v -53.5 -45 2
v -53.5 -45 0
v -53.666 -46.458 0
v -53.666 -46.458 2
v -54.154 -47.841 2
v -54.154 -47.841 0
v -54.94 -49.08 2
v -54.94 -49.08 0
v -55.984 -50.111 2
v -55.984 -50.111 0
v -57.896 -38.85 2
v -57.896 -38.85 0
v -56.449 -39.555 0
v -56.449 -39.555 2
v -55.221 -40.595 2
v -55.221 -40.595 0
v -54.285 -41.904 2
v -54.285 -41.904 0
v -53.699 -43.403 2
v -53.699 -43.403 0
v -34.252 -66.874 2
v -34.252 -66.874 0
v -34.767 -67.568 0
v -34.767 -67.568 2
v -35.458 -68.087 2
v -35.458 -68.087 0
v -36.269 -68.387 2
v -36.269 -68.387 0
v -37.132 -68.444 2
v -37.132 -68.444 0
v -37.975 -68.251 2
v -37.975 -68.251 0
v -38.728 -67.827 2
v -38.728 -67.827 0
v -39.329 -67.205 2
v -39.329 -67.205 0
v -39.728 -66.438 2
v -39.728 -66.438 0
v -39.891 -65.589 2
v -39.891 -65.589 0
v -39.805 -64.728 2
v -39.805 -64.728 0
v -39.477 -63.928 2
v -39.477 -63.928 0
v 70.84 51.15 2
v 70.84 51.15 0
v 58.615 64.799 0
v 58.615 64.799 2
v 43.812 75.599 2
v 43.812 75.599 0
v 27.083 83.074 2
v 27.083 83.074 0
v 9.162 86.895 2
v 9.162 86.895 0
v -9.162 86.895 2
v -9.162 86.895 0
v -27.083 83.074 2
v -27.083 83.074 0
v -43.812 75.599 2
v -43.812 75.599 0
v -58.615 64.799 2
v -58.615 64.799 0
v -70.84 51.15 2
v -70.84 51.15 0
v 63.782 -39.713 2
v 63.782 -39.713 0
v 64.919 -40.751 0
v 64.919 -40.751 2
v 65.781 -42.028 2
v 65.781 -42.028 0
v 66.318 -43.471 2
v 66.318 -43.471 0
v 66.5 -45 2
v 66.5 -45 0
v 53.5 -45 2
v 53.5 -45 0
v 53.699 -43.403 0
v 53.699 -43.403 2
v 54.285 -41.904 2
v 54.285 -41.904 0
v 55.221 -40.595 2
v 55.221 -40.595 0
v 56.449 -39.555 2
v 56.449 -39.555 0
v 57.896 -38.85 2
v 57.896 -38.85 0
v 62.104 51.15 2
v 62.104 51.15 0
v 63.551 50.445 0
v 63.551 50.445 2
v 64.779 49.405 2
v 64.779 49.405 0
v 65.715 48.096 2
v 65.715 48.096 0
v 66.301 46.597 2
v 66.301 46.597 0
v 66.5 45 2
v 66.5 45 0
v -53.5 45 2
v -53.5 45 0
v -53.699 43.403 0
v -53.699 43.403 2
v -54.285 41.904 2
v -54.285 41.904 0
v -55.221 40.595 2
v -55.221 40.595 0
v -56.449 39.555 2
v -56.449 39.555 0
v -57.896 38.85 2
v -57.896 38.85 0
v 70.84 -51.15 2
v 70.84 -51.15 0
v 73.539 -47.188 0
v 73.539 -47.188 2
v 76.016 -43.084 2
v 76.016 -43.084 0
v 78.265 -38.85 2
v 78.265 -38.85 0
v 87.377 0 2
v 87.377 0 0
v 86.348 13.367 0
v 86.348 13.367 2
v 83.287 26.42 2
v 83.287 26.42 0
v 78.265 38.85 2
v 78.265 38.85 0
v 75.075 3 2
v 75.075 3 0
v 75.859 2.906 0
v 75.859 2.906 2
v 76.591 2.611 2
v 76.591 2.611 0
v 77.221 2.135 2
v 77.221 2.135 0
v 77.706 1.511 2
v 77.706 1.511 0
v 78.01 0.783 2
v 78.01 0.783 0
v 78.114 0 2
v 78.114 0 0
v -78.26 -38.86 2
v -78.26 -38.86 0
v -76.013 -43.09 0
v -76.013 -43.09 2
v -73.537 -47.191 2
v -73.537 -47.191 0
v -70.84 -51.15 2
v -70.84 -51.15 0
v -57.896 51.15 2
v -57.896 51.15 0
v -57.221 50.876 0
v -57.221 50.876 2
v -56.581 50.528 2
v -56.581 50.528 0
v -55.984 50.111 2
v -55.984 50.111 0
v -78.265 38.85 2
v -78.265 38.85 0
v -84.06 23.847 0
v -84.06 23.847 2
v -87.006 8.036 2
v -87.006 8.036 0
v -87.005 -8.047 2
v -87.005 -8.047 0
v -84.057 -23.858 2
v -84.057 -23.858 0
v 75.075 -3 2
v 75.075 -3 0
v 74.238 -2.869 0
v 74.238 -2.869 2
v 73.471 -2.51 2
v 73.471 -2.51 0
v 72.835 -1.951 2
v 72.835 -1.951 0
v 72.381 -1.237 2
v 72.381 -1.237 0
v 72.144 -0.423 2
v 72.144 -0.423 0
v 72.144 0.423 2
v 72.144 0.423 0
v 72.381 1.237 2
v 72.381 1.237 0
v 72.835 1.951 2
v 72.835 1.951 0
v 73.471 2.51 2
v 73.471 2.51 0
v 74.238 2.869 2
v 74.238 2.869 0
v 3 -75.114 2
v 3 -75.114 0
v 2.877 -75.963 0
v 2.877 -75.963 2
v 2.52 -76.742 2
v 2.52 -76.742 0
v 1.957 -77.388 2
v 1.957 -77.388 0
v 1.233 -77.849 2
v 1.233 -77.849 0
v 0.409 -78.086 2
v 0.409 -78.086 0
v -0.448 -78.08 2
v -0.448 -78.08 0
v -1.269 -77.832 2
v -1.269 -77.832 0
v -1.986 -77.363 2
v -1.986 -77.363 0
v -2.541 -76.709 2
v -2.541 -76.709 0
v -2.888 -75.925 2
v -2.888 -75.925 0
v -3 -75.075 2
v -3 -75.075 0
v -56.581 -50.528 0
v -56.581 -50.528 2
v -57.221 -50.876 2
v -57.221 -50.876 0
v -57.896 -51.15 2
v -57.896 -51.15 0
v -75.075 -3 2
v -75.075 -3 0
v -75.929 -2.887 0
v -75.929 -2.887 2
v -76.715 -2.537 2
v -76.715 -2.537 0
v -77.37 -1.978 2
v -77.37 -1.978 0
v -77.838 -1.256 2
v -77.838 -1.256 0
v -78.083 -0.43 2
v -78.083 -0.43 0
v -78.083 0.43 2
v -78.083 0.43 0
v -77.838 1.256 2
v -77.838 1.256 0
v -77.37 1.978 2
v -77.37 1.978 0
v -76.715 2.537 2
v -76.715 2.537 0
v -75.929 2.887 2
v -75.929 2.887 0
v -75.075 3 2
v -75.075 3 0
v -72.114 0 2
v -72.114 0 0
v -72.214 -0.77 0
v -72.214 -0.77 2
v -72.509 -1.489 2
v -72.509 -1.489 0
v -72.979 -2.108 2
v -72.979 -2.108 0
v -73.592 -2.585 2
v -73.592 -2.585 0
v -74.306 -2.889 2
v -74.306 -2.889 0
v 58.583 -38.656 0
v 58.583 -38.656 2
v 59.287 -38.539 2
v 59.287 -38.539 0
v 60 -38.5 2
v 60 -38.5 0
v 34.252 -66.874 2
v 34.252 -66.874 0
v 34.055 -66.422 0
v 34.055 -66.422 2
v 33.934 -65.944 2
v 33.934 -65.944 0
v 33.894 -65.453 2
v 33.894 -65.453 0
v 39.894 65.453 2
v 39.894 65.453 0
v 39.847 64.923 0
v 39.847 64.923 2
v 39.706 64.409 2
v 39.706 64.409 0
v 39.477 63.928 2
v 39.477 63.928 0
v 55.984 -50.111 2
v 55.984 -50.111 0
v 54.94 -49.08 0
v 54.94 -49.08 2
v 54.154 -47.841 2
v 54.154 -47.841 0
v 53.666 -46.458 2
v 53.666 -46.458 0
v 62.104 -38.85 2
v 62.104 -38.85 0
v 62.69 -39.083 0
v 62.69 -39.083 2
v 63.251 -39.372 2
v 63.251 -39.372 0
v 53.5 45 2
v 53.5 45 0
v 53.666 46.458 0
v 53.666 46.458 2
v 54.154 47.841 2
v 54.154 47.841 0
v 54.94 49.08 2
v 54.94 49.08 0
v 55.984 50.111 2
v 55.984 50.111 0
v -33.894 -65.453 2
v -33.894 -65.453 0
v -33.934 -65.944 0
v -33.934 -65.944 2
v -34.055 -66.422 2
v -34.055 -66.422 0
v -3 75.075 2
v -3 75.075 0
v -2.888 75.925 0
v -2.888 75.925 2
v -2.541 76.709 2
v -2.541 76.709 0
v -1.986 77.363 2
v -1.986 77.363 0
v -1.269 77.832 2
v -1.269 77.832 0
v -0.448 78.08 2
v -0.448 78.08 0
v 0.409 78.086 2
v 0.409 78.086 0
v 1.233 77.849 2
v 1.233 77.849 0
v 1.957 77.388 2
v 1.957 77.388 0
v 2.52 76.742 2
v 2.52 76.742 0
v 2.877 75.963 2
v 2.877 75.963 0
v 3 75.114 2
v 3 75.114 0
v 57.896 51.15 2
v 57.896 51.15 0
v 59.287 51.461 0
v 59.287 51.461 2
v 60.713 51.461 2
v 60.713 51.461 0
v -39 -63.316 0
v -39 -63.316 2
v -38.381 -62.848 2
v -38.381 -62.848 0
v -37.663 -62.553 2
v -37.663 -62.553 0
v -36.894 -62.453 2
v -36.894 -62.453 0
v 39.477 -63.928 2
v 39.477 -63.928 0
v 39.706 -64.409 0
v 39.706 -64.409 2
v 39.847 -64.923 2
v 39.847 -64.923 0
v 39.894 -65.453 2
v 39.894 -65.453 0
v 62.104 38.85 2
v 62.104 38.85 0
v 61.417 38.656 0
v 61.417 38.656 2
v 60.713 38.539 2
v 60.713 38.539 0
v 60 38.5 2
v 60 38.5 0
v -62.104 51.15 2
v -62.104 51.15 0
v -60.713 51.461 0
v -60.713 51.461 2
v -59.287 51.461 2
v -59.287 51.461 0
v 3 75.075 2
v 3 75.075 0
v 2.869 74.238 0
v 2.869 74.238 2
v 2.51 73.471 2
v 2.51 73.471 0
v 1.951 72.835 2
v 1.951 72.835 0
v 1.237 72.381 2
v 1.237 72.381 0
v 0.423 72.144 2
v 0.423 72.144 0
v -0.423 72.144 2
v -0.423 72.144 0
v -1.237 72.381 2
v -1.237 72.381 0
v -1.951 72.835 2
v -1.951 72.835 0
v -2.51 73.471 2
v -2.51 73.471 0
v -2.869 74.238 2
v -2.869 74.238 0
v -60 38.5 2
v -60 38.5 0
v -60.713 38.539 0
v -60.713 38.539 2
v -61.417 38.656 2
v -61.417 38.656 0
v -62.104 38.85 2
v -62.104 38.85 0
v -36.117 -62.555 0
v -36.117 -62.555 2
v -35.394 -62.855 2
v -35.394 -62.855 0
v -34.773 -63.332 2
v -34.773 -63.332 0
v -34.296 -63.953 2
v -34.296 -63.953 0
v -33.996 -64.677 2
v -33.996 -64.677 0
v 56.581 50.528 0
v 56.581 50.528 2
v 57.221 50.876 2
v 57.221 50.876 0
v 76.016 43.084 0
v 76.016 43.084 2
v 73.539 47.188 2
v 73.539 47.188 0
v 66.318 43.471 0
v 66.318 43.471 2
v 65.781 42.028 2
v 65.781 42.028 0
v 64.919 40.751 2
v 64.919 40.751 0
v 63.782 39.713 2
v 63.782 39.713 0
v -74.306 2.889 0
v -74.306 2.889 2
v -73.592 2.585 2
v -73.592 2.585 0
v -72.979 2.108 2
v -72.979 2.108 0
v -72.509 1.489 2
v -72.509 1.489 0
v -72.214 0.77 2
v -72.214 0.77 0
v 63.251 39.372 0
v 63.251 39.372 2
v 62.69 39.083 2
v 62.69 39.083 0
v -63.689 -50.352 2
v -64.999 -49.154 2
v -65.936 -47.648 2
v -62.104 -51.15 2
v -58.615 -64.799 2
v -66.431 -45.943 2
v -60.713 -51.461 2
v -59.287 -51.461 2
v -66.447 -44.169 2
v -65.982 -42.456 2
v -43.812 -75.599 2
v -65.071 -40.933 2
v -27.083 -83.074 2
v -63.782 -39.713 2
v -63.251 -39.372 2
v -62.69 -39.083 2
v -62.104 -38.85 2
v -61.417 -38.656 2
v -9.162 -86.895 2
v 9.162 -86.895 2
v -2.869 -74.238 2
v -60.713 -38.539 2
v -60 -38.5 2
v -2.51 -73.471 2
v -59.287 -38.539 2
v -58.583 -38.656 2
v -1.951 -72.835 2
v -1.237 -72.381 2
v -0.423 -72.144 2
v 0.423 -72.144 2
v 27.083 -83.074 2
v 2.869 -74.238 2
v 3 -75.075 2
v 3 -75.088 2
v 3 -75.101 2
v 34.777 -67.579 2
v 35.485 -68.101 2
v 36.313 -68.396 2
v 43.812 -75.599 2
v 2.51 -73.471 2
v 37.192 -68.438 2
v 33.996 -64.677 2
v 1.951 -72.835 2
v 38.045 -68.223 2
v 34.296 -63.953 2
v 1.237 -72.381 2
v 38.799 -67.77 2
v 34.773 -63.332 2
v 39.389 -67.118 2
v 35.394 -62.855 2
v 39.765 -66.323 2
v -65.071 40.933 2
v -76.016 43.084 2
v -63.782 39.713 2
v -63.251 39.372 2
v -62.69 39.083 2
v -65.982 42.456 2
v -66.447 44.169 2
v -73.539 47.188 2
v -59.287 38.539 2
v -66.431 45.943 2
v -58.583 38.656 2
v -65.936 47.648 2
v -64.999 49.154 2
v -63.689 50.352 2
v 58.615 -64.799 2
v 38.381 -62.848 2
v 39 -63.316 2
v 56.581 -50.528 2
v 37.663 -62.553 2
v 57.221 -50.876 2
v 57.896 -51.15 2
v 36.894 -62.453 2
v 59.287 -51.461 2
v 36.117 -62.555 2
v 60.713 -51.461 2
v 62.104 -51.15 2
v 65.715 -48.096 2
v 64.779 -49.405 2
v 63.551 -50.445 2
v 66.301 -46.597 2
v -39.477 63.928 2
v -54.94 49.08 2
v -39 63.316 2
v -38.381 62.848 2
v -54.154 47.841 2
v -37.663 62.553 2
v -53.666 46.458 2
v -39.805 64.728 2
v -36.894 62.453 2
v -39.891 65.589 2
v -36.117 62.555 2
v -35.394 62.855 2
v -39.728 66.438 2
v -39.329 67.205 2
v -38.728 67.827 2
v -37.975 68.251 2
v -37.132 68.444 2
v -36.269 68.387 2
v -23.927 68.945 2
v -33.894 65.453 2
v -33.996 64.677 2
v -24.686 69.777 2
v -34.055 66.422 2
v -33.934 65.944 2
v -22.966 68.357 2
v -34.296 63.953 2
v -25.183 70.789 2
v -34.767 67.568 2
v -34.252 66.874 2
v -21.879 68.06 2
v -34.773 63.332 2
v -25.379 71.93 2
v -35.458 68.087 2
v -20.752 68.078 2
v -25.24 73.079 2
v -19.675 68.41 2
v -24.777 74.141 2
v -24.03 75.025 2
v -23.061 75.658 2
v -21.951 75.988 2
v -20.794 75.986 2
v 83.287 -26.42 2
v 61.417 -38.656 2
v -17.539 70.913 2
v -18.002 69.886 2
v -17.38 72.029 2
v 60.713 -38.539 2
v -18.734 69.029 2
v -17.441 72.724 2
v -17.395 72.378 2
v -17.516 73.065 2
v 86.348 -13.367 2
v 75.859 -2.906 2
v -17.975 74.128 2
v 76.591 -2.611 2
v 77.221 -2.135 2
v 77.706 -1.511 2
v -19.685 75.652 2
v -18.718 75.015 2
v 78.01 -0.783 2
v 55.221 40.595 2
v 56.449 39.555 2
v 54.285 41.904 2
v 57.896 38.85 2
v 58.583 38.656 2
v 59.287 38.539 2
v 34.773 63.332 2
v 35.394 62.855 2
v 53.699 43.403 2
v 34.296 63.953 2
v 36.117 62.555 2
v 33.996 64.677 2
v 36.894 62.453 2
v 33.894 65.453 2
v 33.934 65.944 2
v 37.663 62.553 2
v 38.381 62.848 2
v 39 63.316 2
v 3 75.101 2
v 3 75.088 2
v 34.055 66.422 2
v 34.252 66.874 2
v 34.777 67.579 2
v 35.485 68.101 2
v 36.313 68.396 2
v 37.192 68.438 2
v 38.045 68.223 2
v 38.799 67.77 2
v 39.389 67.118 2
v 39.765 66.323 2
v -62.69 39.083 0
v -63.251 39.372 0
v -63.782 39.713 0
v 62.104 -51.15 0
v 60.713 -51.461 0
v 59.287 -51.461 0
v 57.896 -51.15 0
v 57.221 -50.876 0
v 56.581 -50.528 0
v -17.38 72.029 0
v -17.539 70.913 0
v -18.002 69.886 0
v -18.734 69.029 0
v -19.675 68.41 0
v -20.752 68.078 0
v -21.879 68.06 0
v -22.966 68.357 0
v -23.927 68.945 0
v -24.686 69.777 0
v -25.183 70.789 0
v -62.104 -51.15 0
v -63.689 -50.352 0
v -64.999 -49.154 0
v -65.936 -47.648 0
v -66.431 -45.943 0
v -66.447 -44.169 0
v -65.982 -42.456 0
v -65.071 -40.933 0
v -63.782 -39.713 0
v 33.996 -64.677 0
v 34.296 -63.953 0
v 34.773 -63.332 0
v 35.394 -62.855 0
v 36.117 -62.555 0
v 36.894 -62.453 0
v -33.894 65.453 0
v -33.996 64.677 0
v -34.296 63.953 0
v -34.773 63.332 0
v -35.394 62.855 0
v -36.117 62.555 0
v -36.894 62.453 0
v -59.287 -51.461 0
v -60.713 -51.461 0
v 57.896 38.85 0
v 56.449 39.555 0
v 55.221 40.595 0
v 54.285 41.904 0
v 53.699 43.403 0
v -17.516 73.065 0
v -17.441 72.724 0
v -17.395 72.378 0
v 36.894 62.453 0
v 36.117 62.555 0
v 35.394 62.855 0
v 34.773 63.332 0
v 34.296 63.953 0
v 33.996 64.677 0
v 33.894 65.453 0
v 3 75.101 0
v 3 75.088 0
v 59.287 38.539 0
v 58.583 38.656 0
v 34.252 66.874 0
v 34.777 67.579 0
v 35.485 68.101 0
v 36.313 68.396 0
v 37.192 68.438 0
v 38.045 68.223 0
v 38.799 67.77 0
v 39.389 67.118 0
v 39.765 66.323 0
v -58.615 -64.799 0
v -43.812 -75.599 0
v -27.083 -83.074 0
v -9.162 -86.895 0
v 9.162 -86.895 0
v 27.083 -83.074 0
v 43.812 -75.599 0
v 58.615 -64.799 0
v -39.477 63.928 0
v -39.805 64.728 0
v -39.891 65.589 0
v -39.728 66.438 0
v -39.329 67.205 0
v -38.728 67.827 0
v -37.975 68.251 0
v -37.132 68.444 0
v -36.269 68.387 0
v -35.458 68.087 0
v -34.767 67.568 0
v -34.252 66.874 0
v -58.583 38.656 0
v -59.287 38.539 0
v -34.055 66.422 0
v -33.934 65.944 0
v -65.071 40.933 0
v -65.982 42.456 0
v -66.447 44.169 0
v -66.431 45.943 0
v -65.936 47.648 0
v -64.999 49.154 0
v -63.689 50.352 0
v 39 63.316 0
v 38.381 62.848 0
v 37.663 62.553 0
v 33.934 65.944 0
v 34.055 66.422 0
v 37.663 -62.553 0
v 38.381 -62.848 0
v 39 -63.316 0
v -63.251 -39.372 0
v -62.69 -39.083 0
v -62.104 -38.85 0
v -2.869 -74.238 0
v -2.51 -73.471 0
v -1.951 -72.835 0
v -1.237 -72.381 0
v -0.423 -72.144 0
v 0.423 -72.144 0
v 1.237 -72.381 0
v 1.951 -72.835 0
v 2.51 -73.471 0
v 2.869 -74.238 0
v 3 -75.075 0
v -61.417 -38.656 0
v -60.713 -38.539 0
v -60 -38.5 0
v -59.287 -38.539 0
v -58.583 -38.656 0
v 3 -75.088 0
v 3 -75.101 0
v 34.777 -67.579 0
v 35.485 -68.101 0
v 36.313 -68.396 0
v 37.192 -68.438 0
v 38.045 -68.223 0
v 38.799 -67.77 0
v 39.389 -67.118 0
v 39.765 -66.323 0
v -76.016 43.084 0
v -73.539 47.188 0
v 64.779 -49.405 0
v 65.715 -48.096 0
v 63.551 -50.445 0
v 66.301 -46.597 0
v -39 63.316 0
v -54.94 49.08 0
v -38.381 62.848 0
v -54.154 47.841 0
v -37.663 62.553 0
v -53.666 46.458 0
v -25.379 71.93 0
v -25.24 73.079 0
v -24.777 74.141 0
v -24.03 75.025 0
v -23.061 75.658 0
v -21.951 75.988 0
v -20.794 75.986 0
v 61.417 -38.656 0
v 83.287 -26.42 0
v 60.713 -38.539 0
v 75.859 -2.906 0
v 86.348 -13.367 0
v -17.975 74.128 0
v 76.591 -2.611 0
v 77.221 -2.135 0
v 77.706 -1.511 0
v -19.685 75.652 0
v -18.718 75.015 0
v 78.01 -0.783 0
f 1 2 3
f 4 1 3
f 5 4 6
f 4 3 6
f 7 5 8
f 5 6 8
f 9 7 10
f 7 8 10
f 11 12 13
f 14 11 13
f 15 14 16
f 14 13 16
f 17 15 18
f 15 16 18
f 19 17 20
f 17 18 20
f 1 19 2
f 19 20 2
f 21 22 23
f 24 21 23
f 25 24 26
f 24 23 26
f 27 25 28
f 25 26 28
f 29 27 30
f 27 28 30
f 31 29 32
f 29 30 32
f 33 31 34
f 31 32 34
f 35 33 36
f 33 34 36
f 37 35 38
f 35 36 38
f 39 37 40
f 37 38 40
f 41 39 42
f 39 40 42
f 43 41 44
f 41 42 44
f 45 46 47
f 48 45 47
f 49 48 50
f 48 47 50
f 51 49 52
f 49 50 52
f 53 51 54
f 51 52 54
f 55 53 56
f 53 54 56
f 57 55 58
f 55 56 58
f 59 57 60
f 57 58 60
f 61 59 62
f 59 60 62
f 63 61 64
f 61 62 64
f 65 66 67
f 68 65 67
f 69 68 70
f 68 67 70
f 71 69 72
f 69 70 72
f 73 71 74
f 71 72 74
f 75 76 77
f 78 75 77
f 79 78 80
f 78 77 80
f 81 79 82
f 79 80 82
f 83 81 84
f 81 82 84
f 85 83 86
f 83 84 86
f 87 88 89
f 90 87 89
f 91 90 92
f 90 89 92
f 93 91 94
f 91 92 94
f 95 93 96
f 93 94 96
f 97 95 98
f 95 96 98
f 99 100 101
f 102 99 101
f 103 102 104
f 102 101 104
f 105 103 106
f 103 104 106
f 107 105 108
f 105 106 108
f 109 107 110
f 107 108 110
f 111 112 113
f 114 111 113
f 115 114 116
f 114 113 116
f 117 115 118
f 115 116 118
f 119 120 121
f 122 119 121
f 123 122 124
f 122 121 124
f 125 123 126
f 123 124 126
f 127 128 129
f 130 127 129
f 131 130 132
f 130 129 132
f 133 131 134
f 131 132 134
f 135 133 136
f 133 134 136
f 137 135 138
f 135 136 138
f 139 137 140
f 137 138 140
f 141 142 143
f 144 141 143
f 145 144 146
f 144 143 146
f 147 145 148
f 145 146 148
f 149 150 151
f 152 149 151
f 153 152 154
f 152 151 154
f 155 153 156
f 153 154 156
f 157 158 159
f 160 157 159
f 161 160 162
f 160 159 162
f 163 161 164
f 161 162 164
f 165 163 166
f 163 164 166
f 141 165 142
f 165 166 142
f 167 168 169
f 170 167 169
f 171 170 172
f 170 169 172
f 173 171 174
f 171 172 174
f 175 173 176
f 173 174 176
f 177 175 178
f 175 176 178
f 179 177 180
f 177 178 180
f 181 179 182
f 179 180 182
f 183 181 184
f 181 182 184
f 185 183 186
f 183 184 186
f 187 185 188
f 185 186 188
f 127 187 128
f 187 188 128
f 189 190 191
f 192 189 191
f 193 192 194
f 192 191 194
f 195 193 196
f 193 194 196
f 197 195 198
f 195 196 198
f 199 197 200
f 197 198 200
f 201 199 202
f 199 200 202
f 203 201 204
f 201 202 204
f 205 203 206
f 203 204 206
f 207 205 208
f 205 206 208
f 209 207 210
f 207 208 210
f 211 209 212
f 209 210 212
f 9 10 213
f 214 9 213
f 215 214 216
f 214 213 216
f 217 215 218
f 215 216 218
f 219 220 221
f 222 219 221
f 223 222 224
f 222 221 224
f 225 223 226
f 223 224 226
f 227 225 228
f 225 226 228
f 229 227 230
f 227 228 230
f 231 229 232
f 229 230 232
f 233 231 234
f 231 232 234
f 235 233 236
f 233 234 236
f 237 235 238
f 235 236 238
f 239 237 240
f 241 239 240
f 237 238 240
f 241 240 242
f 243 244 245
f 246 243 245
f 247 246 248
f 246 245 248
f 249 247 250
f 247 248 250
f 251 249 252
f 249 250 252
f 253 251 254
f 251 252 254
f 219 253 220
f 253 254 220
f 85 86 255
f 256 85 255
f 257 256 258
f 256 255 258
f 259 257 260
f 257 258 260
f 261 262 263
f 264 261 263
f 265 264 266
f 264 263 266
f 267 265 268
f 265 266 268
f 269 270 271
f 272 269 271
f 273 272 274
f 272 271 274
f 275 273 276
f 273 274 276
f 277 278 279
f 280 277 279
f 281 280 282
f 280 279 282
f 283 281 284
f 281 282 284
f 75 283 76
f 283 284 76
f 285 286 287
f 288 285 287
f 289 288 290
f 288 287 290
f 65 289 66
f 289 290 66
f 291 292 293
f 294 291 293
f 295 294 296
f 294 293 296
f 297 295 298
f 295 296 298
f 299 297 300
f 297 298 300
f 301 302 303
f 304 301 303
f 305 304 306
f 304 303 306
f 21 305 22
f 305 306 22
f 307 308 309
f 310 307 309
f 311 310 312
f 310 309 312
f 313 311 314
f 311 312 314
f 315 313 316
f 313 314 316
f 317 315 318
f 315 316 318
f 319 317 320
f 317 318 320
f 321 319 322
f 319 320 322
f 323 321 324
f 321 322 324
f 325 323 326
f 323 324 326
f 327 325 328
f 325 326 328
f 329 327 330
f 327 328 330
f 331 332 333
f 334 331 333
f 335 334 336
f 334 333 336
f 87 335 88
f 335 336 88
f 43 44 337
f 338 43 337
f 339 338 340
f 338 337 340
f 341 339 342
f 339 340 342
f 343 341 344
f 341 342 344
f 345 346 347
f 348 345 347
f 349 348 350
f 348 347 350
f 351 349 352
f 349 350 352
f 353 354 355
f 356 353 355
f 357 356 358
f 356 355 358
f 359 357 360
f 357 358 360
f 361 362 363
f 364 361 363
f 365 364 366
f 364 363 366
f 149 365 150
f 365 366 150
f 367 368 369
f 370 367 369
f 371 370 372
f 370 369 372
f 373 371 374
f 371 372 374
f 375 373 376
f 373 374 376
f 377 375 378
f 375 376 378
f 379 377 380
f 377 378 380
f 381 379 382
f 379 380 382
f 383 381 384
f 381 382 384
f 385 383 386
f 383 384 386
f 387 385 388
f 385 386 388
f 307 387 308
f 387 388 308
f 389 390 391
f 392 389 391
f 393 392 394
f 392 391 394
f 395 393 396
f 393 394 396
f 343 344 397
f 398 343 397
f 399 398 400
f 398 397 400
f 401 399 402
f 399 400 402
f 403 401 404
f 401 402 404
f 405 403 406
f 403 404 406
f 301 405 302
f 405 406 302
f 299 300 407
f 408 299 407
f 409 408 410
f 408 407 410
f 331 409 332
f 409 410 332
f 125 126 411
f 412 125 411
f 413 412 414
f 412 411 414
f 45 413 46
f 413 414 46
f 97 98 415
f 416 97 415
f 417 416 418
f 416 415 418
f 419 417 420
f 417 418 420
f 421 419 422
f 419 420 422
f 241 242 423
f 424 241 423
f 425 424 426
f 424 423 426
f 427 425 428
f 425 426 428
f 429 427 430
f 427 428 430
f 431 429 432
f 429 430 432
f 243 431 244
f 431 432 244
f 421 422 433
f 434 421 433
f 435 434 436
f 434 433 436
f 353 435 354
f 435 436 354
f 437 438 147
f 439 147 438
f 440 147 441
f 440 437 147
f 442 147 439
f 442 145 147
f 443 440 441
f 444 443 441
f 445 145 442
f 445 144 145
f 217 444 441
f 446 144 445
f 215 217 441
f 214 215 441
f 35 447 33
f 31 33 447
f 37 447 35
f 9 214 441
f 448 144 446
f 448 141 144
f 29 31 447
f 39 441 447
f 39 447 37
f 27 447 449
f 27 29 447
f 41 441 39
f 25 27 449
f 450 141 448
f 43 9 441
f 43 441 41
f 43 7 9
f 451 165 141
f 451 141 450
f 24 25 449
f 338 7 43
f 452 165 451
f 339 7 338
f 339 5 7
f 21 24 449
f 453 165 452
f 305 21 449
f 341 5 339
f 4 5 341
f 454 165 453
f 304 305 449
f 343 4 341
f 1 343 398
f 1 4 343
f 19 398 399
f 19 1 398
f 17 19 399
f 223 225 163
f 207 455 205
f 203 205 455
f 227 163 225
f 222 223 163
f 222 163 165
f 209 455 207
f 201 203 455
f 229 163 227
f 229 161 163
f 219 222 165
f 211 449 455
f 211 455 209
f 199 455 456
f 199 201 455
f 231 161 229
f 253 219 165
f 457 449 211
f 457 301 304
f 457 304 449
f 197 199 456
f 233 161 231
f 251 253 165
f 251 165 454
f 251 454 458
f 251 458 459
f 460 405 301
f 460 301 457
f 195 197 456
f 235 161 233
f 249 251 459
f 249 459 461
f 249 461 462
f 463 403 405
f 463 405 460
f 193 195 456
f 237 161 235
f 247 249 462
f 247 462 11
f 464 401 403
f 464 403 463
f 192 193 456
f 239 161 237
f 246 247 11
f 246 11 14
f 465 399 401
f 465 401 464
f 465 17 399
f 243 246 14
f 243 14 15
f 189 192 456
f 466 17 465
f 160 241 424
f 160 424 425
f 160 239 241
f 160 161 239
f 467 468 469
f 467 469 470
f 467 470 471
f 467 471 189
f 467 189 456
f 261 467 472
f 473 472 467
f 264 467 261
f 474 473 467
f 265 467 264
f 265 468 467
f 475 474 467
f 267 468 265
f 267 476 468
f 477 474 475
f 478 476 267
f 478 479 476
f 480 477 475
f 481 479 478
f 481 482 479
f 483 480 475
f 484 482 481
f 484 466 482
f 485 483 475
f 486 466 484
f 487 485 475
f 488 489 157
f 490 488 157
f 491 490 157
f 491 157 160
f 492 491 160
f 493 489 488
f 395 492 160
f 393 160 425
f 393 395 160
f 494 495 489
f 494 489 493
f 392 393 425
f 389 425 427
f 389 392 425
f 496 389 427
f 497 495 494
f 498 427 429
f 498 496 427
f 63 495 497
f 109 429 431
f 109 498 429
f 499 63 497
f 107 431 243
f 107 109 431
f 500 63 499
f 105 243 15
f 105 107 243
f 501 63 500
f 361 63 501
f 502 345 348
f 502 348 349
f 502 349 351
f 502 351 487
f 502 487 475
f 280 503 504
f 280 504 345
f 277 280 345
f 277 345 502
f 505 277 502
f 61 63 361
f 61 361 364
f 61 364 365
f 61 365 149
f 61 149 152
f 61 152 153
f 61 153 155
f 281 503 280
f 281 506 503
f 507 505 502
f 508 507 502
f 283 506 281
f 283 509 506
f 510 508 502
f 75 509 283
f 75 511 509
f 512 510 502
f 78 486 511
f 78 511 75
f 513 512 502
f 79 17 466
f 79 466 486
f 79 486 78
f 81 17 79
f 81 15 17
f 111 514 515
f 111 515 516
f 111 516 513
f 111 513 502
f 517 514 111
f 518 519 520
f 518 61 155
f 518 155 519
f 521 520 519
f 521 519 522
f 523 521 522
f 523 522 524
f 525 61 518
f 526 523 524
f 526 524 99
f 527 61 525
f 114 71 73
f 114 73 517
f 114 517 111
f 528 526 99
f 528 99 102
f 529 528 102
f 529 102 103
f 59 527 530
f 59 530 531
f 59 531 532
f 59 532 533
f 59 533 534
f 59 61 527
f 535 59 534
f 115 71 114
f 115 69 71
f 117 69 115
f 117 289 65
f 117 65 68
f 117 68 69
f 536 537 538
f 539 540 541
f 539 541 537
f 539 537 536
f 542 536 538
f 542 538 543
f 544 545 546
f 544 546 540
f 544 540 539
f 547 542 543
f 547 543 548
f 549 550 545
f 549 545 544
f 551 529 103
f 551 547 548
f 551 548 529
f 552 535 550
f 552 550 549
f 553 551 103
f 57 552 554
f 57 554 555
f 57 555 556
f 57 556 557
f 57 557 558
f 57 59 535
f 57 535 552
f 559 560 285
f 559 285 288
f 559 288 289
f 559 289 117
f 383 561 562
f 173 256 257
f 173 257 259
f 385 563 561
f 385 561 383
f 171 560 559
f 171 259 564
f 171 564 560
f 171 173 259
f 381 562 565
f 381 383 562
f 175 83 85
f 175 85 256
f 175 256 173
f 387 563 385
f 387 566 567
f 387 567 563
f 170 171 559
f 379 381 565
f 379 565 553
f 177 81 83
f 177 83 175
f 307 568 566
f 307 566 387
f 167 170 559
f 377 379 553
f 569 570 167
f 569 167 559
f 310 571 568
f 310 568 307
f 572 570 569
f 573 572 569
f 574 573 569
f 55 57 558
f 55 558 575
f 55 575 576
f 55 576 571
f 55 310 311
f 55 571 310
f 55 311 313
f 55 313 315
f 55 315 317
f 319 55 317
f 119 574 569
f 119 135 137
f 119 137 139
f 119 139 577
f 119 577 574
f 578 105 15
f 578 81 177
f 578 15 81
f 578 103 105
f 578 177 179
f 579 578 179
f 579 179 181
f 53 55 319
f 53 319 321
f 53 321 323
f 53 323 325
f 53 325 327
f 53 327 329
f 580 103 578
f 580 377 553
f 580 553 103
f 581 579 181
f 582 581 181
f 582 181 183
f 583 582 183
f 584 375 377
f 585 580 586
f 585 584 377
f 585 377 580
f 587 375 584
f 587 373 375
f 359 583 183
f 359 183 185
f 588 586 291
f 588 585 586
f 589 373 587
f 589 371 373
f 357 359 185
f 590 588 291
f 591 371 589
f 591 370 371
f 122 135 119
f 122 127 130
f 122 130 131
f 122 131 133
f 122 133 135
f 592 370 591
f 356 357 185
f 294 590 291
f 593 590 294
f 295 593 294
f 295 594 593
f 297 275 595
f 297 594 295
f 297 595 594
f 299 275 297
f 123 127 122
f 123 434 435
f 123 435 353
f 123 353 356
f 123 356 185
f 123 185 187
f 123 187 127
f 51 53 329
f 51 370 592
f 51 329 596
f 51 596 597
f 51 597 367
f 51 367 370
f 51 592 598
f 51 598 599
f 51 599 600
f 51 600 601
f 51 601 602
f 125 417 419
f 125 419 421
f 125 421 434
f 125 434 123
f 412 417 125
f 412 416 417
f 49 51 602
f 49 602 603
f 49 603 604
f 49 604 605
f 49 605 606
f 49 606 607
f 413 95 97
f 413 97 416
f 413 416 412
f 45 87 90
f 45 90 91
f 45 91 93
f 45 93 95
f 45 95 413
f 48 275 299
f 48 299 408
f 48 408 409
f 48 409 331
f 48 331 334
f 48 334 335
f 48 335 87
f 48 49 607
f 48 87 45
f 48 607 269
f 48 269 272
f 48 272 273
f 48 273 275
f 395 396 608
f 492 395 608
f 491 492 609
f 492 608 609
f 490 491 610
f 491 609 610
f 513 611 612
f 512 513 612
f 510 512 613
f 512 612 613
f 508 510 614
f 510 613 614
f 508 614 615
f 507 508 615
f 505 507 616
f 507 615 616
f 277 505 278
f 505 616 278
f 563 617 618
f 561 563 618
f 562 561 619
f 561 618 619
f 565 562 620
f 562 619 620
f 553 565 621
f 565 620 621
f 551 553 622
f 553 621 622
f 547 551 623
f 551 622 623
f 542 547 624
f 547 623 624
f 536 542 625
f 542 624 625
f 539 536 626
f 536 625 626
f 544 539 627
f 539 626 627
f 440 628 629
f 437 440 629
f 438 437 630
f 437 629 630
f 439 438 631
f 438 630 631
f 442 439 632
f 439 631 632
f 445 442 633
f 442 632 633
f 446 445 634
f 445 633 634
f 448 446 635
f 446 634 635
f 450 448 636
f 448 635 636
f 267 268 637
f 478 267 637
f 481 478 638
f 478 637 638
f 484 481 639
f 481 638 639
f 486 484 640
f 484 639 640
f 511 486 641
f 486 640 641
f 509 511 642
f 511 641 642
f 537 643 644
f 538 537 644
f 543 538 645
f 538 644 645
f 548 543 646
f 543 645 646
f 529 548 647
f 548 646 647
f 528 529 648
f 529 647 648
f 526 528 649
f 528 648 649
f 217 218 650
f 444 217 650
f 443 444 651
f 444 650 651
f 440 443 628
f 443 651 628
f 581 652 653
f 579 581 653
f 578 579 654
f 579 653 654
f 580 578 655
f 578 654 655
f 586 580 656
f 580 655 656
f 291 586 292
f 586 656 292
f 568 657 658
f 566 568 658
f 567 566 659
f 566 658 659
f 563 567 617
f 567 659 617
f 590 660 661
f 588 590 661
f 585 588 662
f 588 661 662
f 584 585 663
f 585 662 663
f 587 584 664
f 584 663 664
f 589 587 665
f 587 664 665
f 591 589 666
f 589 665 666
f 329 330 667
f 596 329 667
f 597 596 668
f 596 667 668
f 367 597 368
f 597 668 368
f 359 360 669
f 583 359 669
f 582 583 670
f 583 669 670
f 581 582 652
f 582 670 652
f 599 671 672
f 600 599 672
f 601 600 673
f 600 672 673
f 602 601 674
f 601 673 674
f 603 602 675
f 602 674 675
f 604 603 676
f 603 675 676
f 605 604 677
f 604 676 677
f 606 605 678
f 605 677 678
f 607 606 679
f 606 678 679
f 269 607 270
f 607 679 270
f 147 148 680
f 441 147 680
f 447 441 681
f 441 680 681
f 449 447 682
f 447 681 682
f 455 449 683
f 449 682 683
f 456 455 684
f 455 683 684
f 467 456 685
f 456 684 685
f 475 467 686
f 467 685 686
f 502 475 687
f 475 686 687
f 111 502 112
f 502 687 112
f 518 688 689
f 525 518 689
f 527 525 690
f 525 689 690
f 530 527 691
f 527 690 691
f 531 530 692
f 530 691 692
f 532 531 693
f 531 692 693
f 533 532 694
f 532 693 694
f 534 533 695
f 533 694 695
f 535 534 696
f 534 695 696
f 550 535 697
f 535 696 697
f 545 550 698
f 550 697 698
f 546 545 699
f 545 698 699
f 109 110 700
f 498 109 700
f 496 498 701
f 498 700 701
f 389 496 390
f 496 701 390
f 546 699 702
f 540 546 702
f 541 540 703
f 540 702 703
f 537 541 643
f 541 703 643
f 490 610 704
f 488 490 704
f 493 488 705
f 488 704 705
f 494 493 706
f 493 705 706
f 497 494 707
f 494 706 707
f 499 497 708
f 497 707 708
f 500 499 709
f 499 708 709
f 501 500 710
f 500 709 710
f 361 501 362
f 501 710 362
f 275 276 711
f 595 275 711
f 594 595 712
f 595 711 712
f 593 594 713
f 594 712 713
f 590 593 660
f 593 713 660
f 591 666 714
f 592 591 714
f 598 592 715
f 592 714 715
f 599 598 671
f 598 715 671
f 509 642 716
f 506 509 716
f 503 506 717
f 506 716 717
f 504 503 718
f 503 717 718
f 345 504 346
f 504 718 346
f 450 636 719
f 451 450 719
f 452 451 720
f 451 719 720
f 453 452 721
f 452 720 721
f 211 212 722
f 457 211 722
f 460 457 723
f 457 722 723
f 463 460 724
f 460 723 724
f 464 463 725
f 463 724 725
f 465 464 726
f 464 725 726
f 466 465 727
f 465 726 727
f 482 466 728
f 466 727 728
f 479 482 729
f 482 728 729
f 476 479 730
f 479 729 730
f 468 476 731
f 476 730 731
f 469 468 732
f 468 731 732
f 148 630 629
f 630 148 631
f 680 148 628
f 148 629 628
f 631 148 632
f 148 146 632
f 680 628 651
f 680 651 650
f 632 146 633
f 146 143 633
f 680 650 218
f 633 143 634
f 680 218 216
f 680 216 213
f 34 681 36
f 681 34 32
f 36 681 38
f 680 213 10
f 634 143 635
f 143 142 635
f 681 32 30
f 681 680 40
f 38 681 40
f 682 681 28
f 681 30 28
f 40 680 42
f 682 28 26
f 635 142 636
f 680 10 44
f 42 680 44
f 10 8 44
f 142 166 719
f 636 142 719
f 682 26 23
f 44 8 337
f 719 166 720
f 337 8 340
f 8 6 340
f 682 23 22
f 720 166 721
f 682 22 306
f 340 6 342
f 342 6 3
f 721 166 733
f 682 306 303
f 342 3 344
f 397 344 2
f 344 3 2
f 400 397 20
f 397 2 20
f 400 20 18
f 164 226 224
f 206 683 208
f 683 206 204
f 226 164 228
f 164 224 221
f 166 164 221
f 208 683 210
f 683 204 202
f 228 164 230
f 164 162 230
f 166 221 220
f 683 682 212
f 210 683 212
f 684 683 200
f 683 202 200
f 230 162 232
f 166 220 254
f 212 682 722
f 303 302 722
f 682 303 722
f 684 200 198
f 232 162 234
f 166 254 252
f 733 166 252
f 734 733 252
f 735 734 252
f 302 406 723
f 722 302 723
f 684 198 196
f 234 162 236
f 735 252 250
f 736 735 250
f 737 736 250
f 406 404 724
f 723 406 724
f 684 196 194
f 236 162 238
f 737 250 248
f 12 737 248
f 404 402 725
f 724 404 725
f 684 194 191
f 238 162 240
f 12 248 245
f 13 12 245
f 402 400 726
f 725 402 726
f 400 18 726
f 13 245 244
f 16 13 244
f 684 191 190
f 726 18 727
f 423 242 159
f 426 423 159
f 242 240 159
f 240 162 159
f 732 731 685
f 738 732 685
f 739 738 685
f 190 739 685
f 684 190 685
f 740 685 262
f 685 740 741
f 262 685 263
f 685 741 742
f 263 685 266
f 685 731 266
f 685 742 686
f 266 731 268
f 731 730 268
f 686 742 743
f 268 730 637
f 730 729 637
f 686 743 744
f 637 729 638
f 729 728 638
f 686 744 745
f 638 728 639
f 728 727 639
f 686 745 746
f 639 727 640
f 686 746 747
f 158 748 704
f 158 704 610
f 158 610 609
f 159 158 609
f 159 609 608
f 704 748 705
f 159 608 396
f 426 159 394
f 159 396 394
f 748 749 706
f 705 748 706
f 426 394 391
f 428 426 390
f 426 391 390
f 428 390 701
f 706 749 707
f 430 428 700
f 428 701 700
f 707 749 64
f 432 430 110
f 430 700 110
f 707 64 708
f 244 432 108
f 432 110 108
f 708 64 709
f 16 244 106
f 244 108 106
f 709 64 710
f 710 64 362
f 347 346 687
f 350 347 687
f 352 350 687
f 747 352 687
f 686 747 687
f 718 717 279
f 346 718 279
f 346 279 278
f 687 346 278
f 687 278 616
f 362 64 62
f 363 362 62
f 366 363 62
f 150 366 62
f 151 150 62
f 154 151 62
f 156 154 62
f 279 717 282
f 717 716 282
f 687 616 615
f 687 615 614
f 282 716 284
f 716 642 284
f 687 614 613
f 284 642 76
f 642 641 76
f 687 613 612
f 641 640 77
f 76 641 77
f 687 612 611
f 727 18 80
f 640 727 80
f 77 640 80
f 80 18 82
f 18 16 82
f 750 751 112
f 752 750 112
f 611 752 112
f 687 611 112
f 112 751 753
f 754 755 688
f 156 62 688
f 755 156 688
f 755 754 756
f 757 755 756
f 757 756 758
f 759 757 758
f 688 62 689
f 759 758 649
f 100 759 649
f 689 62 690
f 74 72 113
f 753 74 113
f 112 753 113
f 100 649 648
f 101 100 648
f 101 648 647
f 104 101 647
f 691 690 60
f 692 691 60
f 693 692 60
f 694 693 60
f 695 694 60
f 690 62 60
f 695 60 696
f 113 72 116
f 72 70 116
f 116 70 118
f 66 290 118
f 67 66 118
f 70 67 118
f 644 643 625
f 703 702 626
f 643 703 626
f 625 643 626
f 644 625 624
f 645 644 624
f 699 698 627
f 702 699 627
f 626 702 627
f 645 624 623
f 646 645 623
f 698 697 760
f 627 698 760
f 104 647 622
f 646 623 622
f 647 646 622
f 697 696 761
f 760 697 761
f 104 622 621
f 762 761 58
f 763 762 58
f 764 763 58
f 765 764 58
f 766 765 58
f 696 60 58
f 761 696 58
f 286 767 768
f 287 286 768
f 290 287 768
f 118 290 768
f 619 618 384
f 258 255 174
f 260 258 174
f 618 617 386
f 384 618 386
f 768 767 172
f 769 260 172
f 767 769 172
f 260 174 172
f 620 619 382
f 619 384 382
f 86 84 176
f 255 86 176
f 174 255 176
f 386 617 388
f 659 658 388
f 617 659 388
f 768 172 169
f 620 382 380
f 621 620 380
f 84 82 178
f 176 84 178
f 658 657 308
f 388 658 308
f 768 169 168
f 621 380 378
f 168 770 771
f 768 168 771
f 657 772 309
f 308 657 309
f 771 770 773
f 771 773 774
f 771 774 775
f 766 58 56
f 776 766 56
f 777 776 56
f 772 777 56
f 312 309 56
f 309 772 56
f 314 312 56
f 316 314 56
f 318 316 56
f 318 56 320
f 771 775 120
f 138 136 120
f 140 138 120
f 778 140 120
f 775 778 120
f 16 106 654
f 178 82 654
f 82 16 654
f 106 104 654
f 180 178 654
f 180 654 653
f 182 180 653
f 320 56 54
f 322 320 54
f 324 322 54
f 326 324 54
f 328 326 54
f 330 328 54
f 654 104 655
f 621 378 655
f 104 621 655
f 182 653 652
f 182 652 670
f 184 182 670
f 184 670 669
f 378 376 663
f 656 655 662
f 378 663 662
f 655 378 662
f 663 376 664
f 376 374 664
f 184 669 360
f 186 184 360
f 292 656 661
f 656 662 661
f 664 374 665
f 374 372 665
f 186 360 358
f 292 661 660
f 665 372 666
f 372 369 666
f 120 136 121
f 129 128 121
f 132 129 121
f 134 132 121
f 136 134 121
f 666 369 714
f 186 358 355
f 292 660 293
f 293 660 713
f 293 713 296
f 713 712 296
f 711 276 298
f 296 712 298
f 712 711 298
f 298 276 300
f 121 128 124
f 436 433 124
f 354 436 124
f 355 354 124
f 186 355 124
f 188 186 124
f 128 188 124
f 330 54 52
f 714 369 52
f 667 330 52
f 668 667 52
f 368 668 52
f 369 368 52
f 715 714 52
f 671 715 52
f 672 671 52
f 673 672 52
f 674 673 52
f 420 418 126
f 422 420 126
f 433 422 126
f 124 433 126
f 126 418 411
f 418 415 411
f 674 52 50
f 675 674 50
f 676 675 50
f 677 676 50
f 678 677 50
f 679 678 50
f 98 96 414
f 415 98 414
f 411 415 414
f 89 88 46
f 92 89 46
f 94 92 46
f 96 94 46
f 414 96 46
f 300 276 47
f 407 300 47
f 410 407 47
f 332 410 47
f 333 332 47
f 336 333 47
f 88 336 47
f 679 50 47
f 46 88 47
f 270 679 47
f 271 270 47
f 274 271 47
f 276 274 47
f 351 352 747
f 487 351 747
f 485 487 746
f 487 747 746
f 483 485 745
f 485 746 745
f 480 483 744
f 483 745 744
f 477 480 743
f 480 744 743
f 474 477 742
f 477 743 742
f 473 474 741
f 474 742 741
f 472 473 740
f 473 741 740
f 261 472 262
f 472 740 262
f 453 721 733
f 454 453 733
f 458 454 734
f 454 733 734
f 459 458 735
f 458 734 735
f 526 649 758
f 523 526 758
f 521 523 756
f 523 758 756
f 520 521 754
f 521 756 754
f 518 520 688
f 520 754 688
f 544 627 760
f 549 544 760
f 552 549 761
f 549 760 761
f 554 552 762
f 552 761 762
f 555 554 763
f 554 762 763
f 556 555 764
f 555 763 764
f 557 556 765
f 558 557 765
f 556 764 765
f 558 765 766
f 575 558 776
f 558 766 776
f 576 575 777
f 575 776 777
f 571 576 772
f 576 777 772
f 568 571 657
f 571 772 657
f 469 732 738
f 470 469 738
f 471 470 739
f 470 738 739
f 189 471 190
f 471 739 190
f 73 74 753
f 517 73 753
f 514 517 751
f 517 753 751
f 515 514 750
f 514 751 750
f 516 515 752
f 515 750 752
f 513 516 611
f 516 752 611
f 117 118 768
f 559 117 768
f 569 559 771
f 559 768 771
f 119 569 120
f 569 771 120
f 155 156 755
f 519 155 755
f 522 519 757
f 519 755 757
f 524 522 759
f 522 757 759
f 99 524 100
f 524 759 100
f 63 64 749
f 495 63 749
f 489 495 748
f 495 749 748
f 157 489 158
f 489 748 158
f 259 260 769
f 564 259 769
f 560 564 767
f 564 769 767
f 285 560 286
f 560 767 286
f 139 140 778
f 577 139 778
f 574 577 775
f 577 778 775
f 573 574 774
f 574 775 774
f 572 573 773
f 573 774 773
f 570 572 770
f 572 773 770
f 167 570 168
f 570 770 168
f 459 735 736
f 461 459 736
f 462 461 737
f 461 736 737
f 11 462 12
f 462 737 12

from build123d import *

# Parameters (mm, degrees)
F0_W     = 73.7878350085
F0_H     = 90
F1_DEPTH = 2


with BuildPart() as f1:
    # F0 (on Top) → F1 (new body)
    with BuildSketch(Plane.XY):
        with BuildLine():
            ThreePointArc((39.4774058129, 63.9279924987), (48.2279395476, 57.613536965), (55.983679509, 50.110691706))
            ThreePointArc((55.983679509, 50.110691706), (56.8959512618, 50.7109440052), (57.8958374587, 51.15))
            ThreePointArc((57.8958374587, 51.15), (60, 51.5), (62.1041625413, 51.15))
            Line((62.1041625413, 51.15), (70.8404665627, 51.15))
            ThreePointArc((70.8404665627, 51.15), (0, 87.3767371949), (-70.8404665627, 51.15))
            Line((-70.8404665627, 51.15), (-62.1041625413, 51.15))
            ThreePointArc((-62.1041625413, 51.15), (-60, 51.5), (-57.8958374587, 51.15))
            ThreePointArc((-57.8958374587, 51.15), (-56.8959512618, 50.7109440052), (-55.983679509, 50.110691706))
            ThreePointArc((-55.983679509, 50.110691706), (-48.2279395476, 57.613536965), (-39.4774058129, 63.9279924987))
            ThreePointArc((-39.4774058129, 63.9279924987), (-38.367024498, 68.0663988295), (-34.2516107138, 66.8736192989))
            ThreePointArc((-34.2516107138, 66.8736192989), (-29.7817001102, 68.980461967), (-25.1829669608, 70.7889254734))
            ThreePointArc((-25.1829669608, 70.7889254734), (-22.5182029217, 75.8634534118), (-17.5164058914, 73.0645558344))
            ThreePointArc((-17.5164058914, 73.0645558344), (-10.3072112299, 74.4245604037), (-2.9997471594, 75.0749979128))
            ThreePointArc((-2.9997471594, 75.0749979128), (-0.0194746205, 78.1138831224), (3, 75.1139463332))
            ThreePointArc((3, 75.1139463332), (2.9999367892, 75.0944717127), (2.9997471594, 75.0749979128))
            ThreePointArc((2.9997471594, 75.0749979128), (19.0717479179, 72.6740822163), (34.2516107138, 66.8736192989))
            ThreePointArc((34.2516107138, 66.8736192989), (37.6264062853, 68.3621830914), (39.8939175043, 65.4529804196))
            ThreePointArc((39.8939175043, 65.4529804196), (39.7879168932, 64.6625580408), (39.4774058129, 63.9279924987))
        make_face()
        with BuildLine():
            Line((-62.1041625413, 51.15), (-70.8404665627, 51.15))
            ThreePointArc((-70.8404665627, 51.15), (-74.8058433026, 45.1528516332), (-78.2647538987, 38.85))
            Line((-78.2647538987, 38.85), (-64.3112066022, 38.85))
            ThreePointArc((-64.3112066022, 38.85), (-64.0479051477, 39.2825615358), (-63.7816943003, 39.713338651))
            ThreePointArc((-63.7816943003, 39.713338651), (-66.4311844471, 45.9433274125), (-62.1041625413, 51.15))
        make_face()
        with BuildLine():
            ThreePointArc((-43.3733789322, 45), (-40.2260149068, 47.834273536), (-36.8939175043, 50.4488736365))
            Line((-36.8939175043, 50.4488736365), (-36.8939175043, 62.4529804196))
            ThreePointArc((-36.8939175043, 62.4529804196), (-38.3813710728, 62.8477008029), (-39.4774058129, 63.9279924987))
            ThreePointArc((-39.4774058129, 63.9279924987), (-48.2279395476, 57.613536965), (-55.983679509, 50.110691706))
            ThreePointArc((-55.983679509, 50.110691706), (-54.1538010985, 47.8411192169), (-53.5, 45))
            Line((-53.5, 45), (-43.3733789322, 45))
        make_face()
        with BuildLine():
            Line((-43.3733789322, 45), (-36.8939175043, 45))
            Line((-36.8939175043, 45), (-36.8939175043, 50.4488736365))
            ThreePointArc((-36.8939175043, 50.4488736365), (-40.2260149068, 47.834273536), (-43.3733789322, 45))
        make_face()
        with BuildLine():
            ThreePointArc((-63.7816943003, 39.713338651), (-64.0479051477, 39.2825615358), (-64.3112066022, 38.85))
            Line((-64.3112066022, 38.85), (-62.1041625413, 38.85))
            ThreePointArc((-62.1041625413, 38.85), (-62.9744186149, 39.2204815163), (-63.7816943003, 39.713338651))
        make_face()
        with BuildLine():
            ThreePointArc((-60, 17.5), (-53.484356292, 32.3368772771), (-43.3733789322, 45))
            Line((-43.3733789322, 45), (-53.5, 45))
            ThreePointArc((-53.5, 45), (-54.7119447564, 41.2202550693), (-57.8958374587, 38.85))
            ThreePointArc((-57.8958374587, 38.85), (-58.9334635496, 38.5880970063), (-60, 38.5))
            Line((-60, 38.5), (-60, 17.5))
        make_face()
        with BuildLine():
            ThreePointArc((-36.8939175043, 50.4488736365), (0, 62.5), (36.8939175043, 50.4488736365))
            Line((36.8939175043, 50.4488736365), (36.8939175043, 62.4529804196))
            ThreePointArc((36.8939175043, 62.4529804196), (34.7725971607, 63.3316600761), (33.8939175043, 65.4529804196))
            Line((33.8939175043, 65.4529804196), (-33.8939175043, 65.4529804196))
            ThreePointArc((-33.8939175043, 65.4529804196), (-34.7725971607, 63.3316600761), (-36.8939175043, 62.4529804196))
            Line((-36.8939175043, 62.4529804196), (-36.8939175043, 50.4488736365))
        make_face()
        with BuildLine():
            Line((-33.8939175043, 65.4529804196), (33.8939175043, 65.4529804196))
            ThreePointArc((33.8939175043, 65.4529804196), (33.9847148325, 66.1854692007), (34.2516107138, 66.8736192989))
            ThreePointArc((34.2516107138, 66.8736192989), (19.0717479179, 72.6740822163), (2.9997471594, 75.0749979128))
            ThreePointArc((2.9997471594, 75.0749979128), (0, 72.1139463332), (-2.9997471594, 75.0749979128))
            ThreePointArc((-2.9997471594, 75.0749979128), (-10.3072112299, 74.4245604037), (-17.5164058914, 73.0645558344))
            ThreePointArc((-17.5164058914, 73.0645558344), (-17.4142364393, 72.5511577989), (-17.3799844218, 72.0288141007))
            ThreePointArc((-17.3799844218, 72.0288141007), (-20.7522624117, 68.0783755075), (-25.1829669608, 70.7889254734))
            ThreePointArc((-25.1829669608, 70.7889254734), (-29.7817001102, 68.980461967), (-34.2516107138, 66.8736192989))
            ThreePointArc((-34.2516107138, 66.8736192989), (-33.9847148325, 66.1854692007), (-33.8939175043, 65.4529804196))
        make_face()
        with BuildLine():
            Line((43.3733789322, 45), (53.5, 45))
            ThreePointArc((53.5, 45), (54.1538010985, 47.8411192169), (55.983679509, 50.110691706))
            ThreePointArc((55.983679509, 50.110691706), (48.2279395476, 57.613536965), (39.4774058129, 63.9279924987))
            ThreePointArc((39.4774058129, 63.9279924987), (38.3813710728, 62.8477008029), (36.8939175043, 62.4529804196))
            Line((36.8939175043, 62.4529804196), (36.8939175043, 50.4488736365))
            ThreePointArc((36.8939175043, 50.4488736365), (40.2260149068, 47.834273536), (43.3733789322, 45))
        make_face()
        with BuildLine():
            Line((-36.8939175043, -45), (-36.8939175043, 45))
            Line((-36.8939175043, 45), (-43.3733789322, 45))
            ThreePointArc((-43.3733789322, 45), (-53.484356292, 32.3368772771), (-60, 17.5))
            Line((-60, 17.5), (-60, -17.5))
            ThreePointArc((-60, -17.5), (-53.484356292, -32.3368772771), (-43.3733789322, -45))
            Line((-43.3733789322, -45), (-36.8939175043, -45))
        make_face()
        with BuildLine():
            Line((-36.8939175043, 45), (36.8939175043, 45))
            Line((36.8939175043, 45), (36.8939175043, 50.4488736365))
            ThreePointArc((36.8939175043, 50.4488736365), (0, 62.5), (-36.8939175043, 50.4488736365))
            Line((-36.8939175043, 50.4488736365), (-36.8939175043, 45))
        make_face()
        with BuildLine():
            ThreePointArc((60, 17.5), (53.484356292, 32.3368772771), (43.3733789322, 45))
            Line((43.3733789322, 45), (36.8939175043, 45))
            Line((36.8939175043, 45), (36.8939175043, -45))
            Line((36.8939175043, -45), (43.3733789322, -45))
            ThreePointArc((43.3733789322, -45), (53.484356292, -32.3368772771), (60, -17.5))
            Line((60, -17.5), (60, 17.5))
        make_face()
        with BuildLine():
            ThreePointArc((62.5, 0), (61.8718433538, 8.8388347648), (60, 17.5))
            Line((60, 17.5), (60, -17.5))
            ThreePointArc((60, -17.5), (61.8718433538, -8.8388347648), (62.5, 0))
        make_face()
        with BuildLine():
            ThreePointArc((57.8958374587, 38.85), (54.7119447564, 41.2202550693), (53.5, 45))
            Line((53.5, 45), (43.3733789322, 45))
            ThreePointArc((43.3733789322, 45), (53.484356292, 32.3368772771), (60, 17.5))
            Line((60, 17.5), (60, 38.5))
            ThreePointArc((60, 38.5), (58.9334635496, 38.5880970063), (57.8958374587, 38.85))
        make_face()
        with BuildLine():
            Line((36.8939175043, 45), (43.3733789322, 45))
            ThreePointArc((43.3733789322, 45), (40.2260149068, 47.834273536), (36.8939175043, 50.4488736365))
            Line((36.8939175043, 50.4488736365), (36.8939175043, 45))
        make_face()
        with BuildLine():
            ThreePointArc((-60, -17.5), (-62.5, 0), (-60, 17.5))
            Line((-60, 17.5), (-60, 38.5))
            ThreePointArc((-60, 38.5), (-61.0665364504, 38.5880970063), (-62.1041625413, 38.85))
            Line((-62.1041625413, 38.85), (-64.3112066022, 38.85))
            ThreePointArc((-64.3112066022, 38.85), (-71.9613692161, 21.6059050996), (-75.0749979128, 2.9997471594))
            ThreePointArc((-75.0749979128, 2.9997471594), (-72.9789000502, 2.1075050105), (-72.1139463332, 0))
            ThreePointArc((-72.1139463332, 0), (-72.9789000502, -2.1075050105), (-75.0749979128, -2.9997471594))
            ThreePointArc((-75.0749979128, -2.9997471594), (-71.9613692161, -21.6059050996), (-64.3112066022, -38.85))
            Line((-64.3112066022, -38.85), (-62.1041625413, -38.85))
            ThreePointArc((-62.1041625413, -38.85), (-61.0665364504, -38.5880970063), (-60, -38.5))
            Line((-60, -38.5), (-60, -17.5))
        make_face()
        with BuildLine():
            Line((-60, -17.5), (-60, 17.5))
            ThreePointArc((-60, 17.5), (-62.5, 0), (-60, -17.5))
        make_face()
        with BuildLine():
            Line((-64.3112066022, 38.85), (-78.2647538987, 38.85))
            ThreePointArc((-78.2647538987, 38.85), (-87.3767370116, -0.0056591785), (-78.2597208023, -38.860137709))
            Line((-78.2597208023, -38.860137709), (-78.2597208023, -38.85))
            Line((-78.2597208023, -38.85), (-64.3112066022, -38.85))
            ThreePointArc((-64.3112066022, -38.85), (-71.9613692161, -21.6059050996), (-75.0749979128, -2.9997471594))
            ThreePointArc((-75.0749979128, -2.9997471594), (-78.1139463332, 0), (-75.0749979128, 2.9997471594))
            ThreePointArc((-75.0749979128, 2.9997471594), (-71.9613692161, 21.6059050996), (-64.3112066022, 38.85))
        make_face()
        with BuildLine():
            ThreePointArc((66.5, 45), (65.7806147144, 42.0277124089), (63.7816943003, 39.713338651))
            ThreePointArc((63.7816943003, 39.713338651), (64.0479051477, 39.2825615358), (64.3112066022, 38.85))
            Line((64.3112066022, 38.85), (78.2647538987, 38.85))
            ThreePointArc((78.2647538987, 38.85), (74.8058433026, 45.1528516332), (70.8404665627, 51.15))
            Line((70.8404665627, 51.15), (62.1041625413, 51.15))
            ThreePointArc((62.1041625413, 51.15), (65.2880552436, 48.7797449307), (66.5, 45))
        make_face()
        with BuildLine():
            ThreePointArc((63.7816943003, 39.713338651), (62.9744186149, 39.2204815163), (62.1041625413, 38.85))
            Line((62.1041625413, 38.85), (64.3112066022, 38.85))
            ThreePointArc((64.3112066022, 38.85), (64.0479051477, 39.2825615358), (63.7816943003, 39.713338651))
        make_face()
        with BuildLine():
            ThreePointArc((62.1041625413, 38.85), (61.0665364504, 38.5880970063), (60, 38.5))
            Line((60, 38.5), (60, 17.5))
            ThreePointArc((60, 17.5), (61.8718433538, 8.8388347648), (62.5, 0))
            ThreePointArc((62.5, 0), (61.8718433538, -8.8388347648), (60, -17.5))
            Line((60, -17.5), (60, -38.5))
            ThreePointArc((60, -38.5), (61.0665364504, -38.5880970063), (62.1041625413, -38.85))
            Line((62.1041625413, -38.85), (64.3112066022, -38.85))
            ThreePointArc((64.3112066022, -38.85), (71.9613692161, -21.6059050996), (75.0749979128, -2.9997471594))
            ThreePointArc((75.0749979128, -2.9997471594), (72.1139463332, 0), (75.0749979128, 2.9997471594))
            ThreePointArc((75.0749979128, 2.9997471594), (71.9613692161, 21.6059050996), (64.3112066022, 38.85))
            Line((64.3112066022, 38.85), (62.1041625413, 38.85))
        make_face()
        with BuildLine():
            Line((78.2647538987, 38.85), (64.3112066022, 38.85))
            ThreePointArc((64.3112066022, 38.85), (71.9613692161, 21.6059050996), (75.0749979128, 2.9997471594))
            ThreePointArc((75.0749979128, 2.9997471594), (77.2214513437, 2.135046283), (78.1139463332, 0))
            ThreePointArc((78.1139463332, 0), (77.2214513437, -2.135046283), (75.0749979128, -2.9997471594))
            ThreePointArc((75.0749979128, -2.9997471594), (71.9613692161, -21.6059050996), (64.3112066022, -38.85))
            Line((64.3112066022, -38.85), (78.2647538987, -38.85))
            ThreePointArc((78.2647538987, -38.85), (85.0682462375, -19.9521348456), (87.3767371949, 0))
            ThreePointArc((87.3767371949, 0), (85.0682462375, 19.9521348456), (78.2647538987, 38.85))
        make_face()
        Rectangle(F0_W, F0_H)
        with BuildLine():
            Line((36.8939175043, -50.4488736365), (36.8939175043, -45))
            Line((36.8939175043, -45), (-36.8939175043, -45))
            Line((-36.8939175043, -45), (-36.8939175043, -50.4488736365))
            ThreePointArc((-36.8939175043, -50.4488736365), (0, -62.5), (36.8939175043, -50.4488736365))
        make_face()
        with BuildLine():
            Line((43.3733789322, -45), (36.8939175043, -45))
            Line((36.8939175043, -45), (36.8939175043, -50.4488736365))
            ThreePointArc((36.8939175043, -50.4488736365), (40.2260149068, -47.834273536), (43.3733789322, -45))
        make_face()
        with BuildLine():
            Line((-36.8939175043, -50.4488736365), (-36.8939175043, -45))
            Line((-36.8939175043, -45), (-43.3733789322, -45))
            ThreePointArc((-43.3733789322, -45), (-40.2260149068, -47.834273536), (-36.8939175043, -50.4488736365))
        make_face()
        with BuildLine():
            Line((-53.5, -45), (-43.3733789322, -45))
            ThreePointArc((-43.3733789322, -45), (-53.484356292, -32.3368772771), (-60, -17.5))
            Line((-60, -17.5), (-60, -38.5))
            ThreePointArc((-60, -38.5), (-58.9334635496, -38.5880970063), (-57.8958374587, -38.85))
            ThreePointArc((-57.8958374587, -38.85), (-54.7119447564, -41.2202550693), (-53.5, -45))
        make_face()
        with BuildLine():
            Line((36.8939175043, -62.4529804196), (36.8939175043, -50.4488736365))
            ThreePointArc((36.8939175043, -50.4488736365), (0, -62.5), (-36.8939175043, -50.4488736365))
            Line((-36.8939175043, -50.4488736365), (-36.8939175043, -62.4529804196))
            ThreePointArc((-36.8939175043, -62.4529804196), (-34.7725971607, -63.3316600761), (-33.8939175043, -65.4529804196))
            Line((-33.8939175043, -65.4529804196), (33.8939175043, -65.4529804196))
            ThreePointArc((33.8939175043, -65.4529804196), (34.7725971607, -63.3316600761), (36.8939175043, -62.4529804196))
        make_face()
        with BuildLine():
            ThreePointArc((34.2516107138, -66.8736192989), (33.9847148325, -66.1854692007), (33.8939175043, -65.4529804196))
            Line((33.8939175043, -65.4529804196), (-33.8939175043, -65.4529804196))
            ThreePointArc((-33.8939175043, -65.4529804196), (-33.9847148325, -66.1854692007), (-34.2516107138, -66.8736192989))
            ThreePointArc((-34.2516107138, -66.8736192989), (-19.0717479179, -72.6740822163), (-2.9997471594, -75.0749979128))
            ThreePointArc((-2.9997471594, -75.0749979128), (0, -72.1139463332), (2.9997471594, -75.0749979128))
            ThreePointArc((2.9997471594, -75.0749979128), (19.0717479179, -72.6740822163), (34.2516107138, -66.8736192989))
        make_face()
        with BuildLine():
            ThreePointArc((57.8958374587, -51.15), (56.8959512618, -50.7109440052), (55.983679509, -50.110691706))
            ThreePointArc((55.983679509, -50.110691706), (48.2279395476, -57.613536965), (39.4774058129, -63.9279924987))
            ThreePointArc((39.4774058129, -63.9279924987), (39.7879168932, -64.6625580408), (39.8939175043, -65.4529804196))
            ThreePointArc((39.8939175043, -65.4529804196), (37.6264062853, -68.3621830914), (34.2516107138, -66.8736192989))
            ThreePointArc((34.2516107138, -66.8736192989), (19.0717479179, -72.6740822163), (2.9997471594, -75.0749979128))
            ThreePointArc((2.9997471594, -75.0749979128), (2.9999367892, -75.0944717127), (3, -75.1139463332))
            ThreePointArc((3, -75.1139463332), (-0.0194746205, -78.1138831224), (-2.9997471594, -75.0749979128))
            ThreePointArc((-2.9997471594, -75.0749979128), (-19.0717479179, -72.6740822163), (-34.2516107138, -66.8736192989))
            ThreePointArc((-34.2516107138, -66.8736192989), (-38.367024498, -68.0663988295), (-39.4774058129, -63.9279924987))
            ThreePointArc((-39.4774058129, -63.9279924987), (-48.2279395476, -57.613536965), (-55.983679509, -50.110691706))
            ThreePointArc((-55.983679509, -50.110691706), (-56.8959512618, -50.7109440052), (-57.8958374587, -51.15))
            ThreePointArc((-57.8958374587, -51.15), (-60, -51.5), (-62.1041625413, -51.15))
            Line((-62.1041625413, -51.15), (-70.8404665627, -51.15))
            ThreePointArc((-70.8404665627, -51.15), (0, -87.3767371949), (70.8404665627, -51.15))
            Line((70.8404665627, -51.15), (62.1041625413, -51.15))
            ThreePointArc((62.1041625413, -51.15), (60, -51.5), (57.8958374587, -51.15))
        make_face()
        with BuildLine():
            Line((53.5, -45), (43.3733789322, -45))
            ThreePointArc((43.3733789322, -45), (40.2260149068, -47.834273536), (36.8939175043, -50.4488736365))
            Line((36.8939175043, -50.4488736365), (36.8939175043, -62.4529804196))
            ThreePointArc((36.8939175043, -62.4529804196), (38.3813710728, -62.8477008029), (39.4774058129, -63.9279924987))
            ThreePointArc((39.4774058129, -63.9279924987), (48.2279395476, -57.613536965), (55.983679509, -50.110691706))
            ThreePointArc((55.983679509, -50.110691706), (54.1538010985, -47.8411192169), (53.5, -45))
        make_face()
        with BuildLine():
            Line((60, -38.5), (60, -17.5))
            ThreePointArc((60, -17.5), (53.484356292, -32.3368772771), (43.3733789322, -45))
            Line((43.3733789322, -45), (53.5, -45))
            ThreePointArc((53.5, -45), (54.7119447564, -41.2202550693), (57.8958374587, -38.85))
            ThreePointArc((57.8958374587, -38.85), (58.9334635496, -38.5880970063), (60, -38.5))
        make_face()
        with BuildLine():
            ThreePointArc((-36.8939175043, -50.4488736365), (-40.2260149068, -47.834273536), (-43.3733789322, -45))
            Line((-43.3733789322, -45), (-53.5, -45))
            ThreePointArc((-53.5, -45), (-54.1538010985, -47.8411192169), (-55.983679509, -50.110691706))
            ThreePointArc((-55.983679509, -50.110691706), (-48.2279395476, -57.613536965), (-39.4774058129, -63.9279924987))
            ThreePointArc((-39.4774058129, -63.9279924987), (-38.3813710728, -62.8477008029), (-36.8939175043, -62.4529804196))
            Line((-36.8939175043, -62.4529804196), (-36.8939175043, -50.4488736365))
        make_face()
        with BuildLine():
            ThreePointArc((70.8404665627, -51.15), (74.8058433026, -45.1528516332), (78.2647538987, -38.85))
            Line((78.2647538987, -38.85), (64.3112066022, -38.85))
            ThreePointArc((64.3112066022, -38.85), (64.0479051477, -39.2825615358), (63.7816943003, -39.713338651))
            ThreePointArc((63.7816943003, -39.713338651), (65.7806147144, -42.0277124089), (66.5, -45))
            ThreePointArc((66.5, -45), (65.2880552436, -48.7797449307), (62.1041625413, -51.15))
            Line((62.1041625413, -51.15), (70.8404665627, -51.15))
        make_face()
        with BuildLine():
            Line((64.3112066022, -38.85), (62.1041625413, -38.85))
            ThreePointArc((62.1041625413, -38.85), (62.9744186149, -39.2204815163), (63.7816943003, -39.713338651))
            ThreePointArc((63.7816943003, -39.713338651), (64.0479051477, -39.2825615358), (64.3112066022, -38.85))
        make_face()
        with BuildLine():
            Line((-78.2597208023, -38.85), (-78.2597208023, -38.860137709))
            ThreePointArc((-78.2597208023, -38.860137709), (-74.8029187054, -45.1576965308), (-70.8404665627, -51.15))
            Line((-70.8404665627, -51.15), (-62.1041625413, -51.15))
            ThreePointArc((-62.1041625413, -51.15), (-66.4311844471, -45.9433274125), (-63.7816943003, -39.713338651))
            ThreePointArc((-63.7816943003, -39.713338651), (-64.0479051477, -39.2825615358), (-64.3112066022, -38.85))
            Line((-64.3112066022, -38.85), (-78.2597208023, -38.85))
        make_face()
        with BuildLine():
            ThreePointArc((-63.7816943003, -39.713338651), (-62.9744186149, -39.2204815163), (-62.1041625413, -38.85))
            Line((-62.1041625413, -38.85), (-64.3112066022, -38.85))
            ThreePointArc((-64.3112066022, -38.85), (-64.0479051477, -39.2825615358), (-63.7816943003, -39.713338651))
        make_face()
    extrude(amount=F1_DEPTH)


solid = f1.part
